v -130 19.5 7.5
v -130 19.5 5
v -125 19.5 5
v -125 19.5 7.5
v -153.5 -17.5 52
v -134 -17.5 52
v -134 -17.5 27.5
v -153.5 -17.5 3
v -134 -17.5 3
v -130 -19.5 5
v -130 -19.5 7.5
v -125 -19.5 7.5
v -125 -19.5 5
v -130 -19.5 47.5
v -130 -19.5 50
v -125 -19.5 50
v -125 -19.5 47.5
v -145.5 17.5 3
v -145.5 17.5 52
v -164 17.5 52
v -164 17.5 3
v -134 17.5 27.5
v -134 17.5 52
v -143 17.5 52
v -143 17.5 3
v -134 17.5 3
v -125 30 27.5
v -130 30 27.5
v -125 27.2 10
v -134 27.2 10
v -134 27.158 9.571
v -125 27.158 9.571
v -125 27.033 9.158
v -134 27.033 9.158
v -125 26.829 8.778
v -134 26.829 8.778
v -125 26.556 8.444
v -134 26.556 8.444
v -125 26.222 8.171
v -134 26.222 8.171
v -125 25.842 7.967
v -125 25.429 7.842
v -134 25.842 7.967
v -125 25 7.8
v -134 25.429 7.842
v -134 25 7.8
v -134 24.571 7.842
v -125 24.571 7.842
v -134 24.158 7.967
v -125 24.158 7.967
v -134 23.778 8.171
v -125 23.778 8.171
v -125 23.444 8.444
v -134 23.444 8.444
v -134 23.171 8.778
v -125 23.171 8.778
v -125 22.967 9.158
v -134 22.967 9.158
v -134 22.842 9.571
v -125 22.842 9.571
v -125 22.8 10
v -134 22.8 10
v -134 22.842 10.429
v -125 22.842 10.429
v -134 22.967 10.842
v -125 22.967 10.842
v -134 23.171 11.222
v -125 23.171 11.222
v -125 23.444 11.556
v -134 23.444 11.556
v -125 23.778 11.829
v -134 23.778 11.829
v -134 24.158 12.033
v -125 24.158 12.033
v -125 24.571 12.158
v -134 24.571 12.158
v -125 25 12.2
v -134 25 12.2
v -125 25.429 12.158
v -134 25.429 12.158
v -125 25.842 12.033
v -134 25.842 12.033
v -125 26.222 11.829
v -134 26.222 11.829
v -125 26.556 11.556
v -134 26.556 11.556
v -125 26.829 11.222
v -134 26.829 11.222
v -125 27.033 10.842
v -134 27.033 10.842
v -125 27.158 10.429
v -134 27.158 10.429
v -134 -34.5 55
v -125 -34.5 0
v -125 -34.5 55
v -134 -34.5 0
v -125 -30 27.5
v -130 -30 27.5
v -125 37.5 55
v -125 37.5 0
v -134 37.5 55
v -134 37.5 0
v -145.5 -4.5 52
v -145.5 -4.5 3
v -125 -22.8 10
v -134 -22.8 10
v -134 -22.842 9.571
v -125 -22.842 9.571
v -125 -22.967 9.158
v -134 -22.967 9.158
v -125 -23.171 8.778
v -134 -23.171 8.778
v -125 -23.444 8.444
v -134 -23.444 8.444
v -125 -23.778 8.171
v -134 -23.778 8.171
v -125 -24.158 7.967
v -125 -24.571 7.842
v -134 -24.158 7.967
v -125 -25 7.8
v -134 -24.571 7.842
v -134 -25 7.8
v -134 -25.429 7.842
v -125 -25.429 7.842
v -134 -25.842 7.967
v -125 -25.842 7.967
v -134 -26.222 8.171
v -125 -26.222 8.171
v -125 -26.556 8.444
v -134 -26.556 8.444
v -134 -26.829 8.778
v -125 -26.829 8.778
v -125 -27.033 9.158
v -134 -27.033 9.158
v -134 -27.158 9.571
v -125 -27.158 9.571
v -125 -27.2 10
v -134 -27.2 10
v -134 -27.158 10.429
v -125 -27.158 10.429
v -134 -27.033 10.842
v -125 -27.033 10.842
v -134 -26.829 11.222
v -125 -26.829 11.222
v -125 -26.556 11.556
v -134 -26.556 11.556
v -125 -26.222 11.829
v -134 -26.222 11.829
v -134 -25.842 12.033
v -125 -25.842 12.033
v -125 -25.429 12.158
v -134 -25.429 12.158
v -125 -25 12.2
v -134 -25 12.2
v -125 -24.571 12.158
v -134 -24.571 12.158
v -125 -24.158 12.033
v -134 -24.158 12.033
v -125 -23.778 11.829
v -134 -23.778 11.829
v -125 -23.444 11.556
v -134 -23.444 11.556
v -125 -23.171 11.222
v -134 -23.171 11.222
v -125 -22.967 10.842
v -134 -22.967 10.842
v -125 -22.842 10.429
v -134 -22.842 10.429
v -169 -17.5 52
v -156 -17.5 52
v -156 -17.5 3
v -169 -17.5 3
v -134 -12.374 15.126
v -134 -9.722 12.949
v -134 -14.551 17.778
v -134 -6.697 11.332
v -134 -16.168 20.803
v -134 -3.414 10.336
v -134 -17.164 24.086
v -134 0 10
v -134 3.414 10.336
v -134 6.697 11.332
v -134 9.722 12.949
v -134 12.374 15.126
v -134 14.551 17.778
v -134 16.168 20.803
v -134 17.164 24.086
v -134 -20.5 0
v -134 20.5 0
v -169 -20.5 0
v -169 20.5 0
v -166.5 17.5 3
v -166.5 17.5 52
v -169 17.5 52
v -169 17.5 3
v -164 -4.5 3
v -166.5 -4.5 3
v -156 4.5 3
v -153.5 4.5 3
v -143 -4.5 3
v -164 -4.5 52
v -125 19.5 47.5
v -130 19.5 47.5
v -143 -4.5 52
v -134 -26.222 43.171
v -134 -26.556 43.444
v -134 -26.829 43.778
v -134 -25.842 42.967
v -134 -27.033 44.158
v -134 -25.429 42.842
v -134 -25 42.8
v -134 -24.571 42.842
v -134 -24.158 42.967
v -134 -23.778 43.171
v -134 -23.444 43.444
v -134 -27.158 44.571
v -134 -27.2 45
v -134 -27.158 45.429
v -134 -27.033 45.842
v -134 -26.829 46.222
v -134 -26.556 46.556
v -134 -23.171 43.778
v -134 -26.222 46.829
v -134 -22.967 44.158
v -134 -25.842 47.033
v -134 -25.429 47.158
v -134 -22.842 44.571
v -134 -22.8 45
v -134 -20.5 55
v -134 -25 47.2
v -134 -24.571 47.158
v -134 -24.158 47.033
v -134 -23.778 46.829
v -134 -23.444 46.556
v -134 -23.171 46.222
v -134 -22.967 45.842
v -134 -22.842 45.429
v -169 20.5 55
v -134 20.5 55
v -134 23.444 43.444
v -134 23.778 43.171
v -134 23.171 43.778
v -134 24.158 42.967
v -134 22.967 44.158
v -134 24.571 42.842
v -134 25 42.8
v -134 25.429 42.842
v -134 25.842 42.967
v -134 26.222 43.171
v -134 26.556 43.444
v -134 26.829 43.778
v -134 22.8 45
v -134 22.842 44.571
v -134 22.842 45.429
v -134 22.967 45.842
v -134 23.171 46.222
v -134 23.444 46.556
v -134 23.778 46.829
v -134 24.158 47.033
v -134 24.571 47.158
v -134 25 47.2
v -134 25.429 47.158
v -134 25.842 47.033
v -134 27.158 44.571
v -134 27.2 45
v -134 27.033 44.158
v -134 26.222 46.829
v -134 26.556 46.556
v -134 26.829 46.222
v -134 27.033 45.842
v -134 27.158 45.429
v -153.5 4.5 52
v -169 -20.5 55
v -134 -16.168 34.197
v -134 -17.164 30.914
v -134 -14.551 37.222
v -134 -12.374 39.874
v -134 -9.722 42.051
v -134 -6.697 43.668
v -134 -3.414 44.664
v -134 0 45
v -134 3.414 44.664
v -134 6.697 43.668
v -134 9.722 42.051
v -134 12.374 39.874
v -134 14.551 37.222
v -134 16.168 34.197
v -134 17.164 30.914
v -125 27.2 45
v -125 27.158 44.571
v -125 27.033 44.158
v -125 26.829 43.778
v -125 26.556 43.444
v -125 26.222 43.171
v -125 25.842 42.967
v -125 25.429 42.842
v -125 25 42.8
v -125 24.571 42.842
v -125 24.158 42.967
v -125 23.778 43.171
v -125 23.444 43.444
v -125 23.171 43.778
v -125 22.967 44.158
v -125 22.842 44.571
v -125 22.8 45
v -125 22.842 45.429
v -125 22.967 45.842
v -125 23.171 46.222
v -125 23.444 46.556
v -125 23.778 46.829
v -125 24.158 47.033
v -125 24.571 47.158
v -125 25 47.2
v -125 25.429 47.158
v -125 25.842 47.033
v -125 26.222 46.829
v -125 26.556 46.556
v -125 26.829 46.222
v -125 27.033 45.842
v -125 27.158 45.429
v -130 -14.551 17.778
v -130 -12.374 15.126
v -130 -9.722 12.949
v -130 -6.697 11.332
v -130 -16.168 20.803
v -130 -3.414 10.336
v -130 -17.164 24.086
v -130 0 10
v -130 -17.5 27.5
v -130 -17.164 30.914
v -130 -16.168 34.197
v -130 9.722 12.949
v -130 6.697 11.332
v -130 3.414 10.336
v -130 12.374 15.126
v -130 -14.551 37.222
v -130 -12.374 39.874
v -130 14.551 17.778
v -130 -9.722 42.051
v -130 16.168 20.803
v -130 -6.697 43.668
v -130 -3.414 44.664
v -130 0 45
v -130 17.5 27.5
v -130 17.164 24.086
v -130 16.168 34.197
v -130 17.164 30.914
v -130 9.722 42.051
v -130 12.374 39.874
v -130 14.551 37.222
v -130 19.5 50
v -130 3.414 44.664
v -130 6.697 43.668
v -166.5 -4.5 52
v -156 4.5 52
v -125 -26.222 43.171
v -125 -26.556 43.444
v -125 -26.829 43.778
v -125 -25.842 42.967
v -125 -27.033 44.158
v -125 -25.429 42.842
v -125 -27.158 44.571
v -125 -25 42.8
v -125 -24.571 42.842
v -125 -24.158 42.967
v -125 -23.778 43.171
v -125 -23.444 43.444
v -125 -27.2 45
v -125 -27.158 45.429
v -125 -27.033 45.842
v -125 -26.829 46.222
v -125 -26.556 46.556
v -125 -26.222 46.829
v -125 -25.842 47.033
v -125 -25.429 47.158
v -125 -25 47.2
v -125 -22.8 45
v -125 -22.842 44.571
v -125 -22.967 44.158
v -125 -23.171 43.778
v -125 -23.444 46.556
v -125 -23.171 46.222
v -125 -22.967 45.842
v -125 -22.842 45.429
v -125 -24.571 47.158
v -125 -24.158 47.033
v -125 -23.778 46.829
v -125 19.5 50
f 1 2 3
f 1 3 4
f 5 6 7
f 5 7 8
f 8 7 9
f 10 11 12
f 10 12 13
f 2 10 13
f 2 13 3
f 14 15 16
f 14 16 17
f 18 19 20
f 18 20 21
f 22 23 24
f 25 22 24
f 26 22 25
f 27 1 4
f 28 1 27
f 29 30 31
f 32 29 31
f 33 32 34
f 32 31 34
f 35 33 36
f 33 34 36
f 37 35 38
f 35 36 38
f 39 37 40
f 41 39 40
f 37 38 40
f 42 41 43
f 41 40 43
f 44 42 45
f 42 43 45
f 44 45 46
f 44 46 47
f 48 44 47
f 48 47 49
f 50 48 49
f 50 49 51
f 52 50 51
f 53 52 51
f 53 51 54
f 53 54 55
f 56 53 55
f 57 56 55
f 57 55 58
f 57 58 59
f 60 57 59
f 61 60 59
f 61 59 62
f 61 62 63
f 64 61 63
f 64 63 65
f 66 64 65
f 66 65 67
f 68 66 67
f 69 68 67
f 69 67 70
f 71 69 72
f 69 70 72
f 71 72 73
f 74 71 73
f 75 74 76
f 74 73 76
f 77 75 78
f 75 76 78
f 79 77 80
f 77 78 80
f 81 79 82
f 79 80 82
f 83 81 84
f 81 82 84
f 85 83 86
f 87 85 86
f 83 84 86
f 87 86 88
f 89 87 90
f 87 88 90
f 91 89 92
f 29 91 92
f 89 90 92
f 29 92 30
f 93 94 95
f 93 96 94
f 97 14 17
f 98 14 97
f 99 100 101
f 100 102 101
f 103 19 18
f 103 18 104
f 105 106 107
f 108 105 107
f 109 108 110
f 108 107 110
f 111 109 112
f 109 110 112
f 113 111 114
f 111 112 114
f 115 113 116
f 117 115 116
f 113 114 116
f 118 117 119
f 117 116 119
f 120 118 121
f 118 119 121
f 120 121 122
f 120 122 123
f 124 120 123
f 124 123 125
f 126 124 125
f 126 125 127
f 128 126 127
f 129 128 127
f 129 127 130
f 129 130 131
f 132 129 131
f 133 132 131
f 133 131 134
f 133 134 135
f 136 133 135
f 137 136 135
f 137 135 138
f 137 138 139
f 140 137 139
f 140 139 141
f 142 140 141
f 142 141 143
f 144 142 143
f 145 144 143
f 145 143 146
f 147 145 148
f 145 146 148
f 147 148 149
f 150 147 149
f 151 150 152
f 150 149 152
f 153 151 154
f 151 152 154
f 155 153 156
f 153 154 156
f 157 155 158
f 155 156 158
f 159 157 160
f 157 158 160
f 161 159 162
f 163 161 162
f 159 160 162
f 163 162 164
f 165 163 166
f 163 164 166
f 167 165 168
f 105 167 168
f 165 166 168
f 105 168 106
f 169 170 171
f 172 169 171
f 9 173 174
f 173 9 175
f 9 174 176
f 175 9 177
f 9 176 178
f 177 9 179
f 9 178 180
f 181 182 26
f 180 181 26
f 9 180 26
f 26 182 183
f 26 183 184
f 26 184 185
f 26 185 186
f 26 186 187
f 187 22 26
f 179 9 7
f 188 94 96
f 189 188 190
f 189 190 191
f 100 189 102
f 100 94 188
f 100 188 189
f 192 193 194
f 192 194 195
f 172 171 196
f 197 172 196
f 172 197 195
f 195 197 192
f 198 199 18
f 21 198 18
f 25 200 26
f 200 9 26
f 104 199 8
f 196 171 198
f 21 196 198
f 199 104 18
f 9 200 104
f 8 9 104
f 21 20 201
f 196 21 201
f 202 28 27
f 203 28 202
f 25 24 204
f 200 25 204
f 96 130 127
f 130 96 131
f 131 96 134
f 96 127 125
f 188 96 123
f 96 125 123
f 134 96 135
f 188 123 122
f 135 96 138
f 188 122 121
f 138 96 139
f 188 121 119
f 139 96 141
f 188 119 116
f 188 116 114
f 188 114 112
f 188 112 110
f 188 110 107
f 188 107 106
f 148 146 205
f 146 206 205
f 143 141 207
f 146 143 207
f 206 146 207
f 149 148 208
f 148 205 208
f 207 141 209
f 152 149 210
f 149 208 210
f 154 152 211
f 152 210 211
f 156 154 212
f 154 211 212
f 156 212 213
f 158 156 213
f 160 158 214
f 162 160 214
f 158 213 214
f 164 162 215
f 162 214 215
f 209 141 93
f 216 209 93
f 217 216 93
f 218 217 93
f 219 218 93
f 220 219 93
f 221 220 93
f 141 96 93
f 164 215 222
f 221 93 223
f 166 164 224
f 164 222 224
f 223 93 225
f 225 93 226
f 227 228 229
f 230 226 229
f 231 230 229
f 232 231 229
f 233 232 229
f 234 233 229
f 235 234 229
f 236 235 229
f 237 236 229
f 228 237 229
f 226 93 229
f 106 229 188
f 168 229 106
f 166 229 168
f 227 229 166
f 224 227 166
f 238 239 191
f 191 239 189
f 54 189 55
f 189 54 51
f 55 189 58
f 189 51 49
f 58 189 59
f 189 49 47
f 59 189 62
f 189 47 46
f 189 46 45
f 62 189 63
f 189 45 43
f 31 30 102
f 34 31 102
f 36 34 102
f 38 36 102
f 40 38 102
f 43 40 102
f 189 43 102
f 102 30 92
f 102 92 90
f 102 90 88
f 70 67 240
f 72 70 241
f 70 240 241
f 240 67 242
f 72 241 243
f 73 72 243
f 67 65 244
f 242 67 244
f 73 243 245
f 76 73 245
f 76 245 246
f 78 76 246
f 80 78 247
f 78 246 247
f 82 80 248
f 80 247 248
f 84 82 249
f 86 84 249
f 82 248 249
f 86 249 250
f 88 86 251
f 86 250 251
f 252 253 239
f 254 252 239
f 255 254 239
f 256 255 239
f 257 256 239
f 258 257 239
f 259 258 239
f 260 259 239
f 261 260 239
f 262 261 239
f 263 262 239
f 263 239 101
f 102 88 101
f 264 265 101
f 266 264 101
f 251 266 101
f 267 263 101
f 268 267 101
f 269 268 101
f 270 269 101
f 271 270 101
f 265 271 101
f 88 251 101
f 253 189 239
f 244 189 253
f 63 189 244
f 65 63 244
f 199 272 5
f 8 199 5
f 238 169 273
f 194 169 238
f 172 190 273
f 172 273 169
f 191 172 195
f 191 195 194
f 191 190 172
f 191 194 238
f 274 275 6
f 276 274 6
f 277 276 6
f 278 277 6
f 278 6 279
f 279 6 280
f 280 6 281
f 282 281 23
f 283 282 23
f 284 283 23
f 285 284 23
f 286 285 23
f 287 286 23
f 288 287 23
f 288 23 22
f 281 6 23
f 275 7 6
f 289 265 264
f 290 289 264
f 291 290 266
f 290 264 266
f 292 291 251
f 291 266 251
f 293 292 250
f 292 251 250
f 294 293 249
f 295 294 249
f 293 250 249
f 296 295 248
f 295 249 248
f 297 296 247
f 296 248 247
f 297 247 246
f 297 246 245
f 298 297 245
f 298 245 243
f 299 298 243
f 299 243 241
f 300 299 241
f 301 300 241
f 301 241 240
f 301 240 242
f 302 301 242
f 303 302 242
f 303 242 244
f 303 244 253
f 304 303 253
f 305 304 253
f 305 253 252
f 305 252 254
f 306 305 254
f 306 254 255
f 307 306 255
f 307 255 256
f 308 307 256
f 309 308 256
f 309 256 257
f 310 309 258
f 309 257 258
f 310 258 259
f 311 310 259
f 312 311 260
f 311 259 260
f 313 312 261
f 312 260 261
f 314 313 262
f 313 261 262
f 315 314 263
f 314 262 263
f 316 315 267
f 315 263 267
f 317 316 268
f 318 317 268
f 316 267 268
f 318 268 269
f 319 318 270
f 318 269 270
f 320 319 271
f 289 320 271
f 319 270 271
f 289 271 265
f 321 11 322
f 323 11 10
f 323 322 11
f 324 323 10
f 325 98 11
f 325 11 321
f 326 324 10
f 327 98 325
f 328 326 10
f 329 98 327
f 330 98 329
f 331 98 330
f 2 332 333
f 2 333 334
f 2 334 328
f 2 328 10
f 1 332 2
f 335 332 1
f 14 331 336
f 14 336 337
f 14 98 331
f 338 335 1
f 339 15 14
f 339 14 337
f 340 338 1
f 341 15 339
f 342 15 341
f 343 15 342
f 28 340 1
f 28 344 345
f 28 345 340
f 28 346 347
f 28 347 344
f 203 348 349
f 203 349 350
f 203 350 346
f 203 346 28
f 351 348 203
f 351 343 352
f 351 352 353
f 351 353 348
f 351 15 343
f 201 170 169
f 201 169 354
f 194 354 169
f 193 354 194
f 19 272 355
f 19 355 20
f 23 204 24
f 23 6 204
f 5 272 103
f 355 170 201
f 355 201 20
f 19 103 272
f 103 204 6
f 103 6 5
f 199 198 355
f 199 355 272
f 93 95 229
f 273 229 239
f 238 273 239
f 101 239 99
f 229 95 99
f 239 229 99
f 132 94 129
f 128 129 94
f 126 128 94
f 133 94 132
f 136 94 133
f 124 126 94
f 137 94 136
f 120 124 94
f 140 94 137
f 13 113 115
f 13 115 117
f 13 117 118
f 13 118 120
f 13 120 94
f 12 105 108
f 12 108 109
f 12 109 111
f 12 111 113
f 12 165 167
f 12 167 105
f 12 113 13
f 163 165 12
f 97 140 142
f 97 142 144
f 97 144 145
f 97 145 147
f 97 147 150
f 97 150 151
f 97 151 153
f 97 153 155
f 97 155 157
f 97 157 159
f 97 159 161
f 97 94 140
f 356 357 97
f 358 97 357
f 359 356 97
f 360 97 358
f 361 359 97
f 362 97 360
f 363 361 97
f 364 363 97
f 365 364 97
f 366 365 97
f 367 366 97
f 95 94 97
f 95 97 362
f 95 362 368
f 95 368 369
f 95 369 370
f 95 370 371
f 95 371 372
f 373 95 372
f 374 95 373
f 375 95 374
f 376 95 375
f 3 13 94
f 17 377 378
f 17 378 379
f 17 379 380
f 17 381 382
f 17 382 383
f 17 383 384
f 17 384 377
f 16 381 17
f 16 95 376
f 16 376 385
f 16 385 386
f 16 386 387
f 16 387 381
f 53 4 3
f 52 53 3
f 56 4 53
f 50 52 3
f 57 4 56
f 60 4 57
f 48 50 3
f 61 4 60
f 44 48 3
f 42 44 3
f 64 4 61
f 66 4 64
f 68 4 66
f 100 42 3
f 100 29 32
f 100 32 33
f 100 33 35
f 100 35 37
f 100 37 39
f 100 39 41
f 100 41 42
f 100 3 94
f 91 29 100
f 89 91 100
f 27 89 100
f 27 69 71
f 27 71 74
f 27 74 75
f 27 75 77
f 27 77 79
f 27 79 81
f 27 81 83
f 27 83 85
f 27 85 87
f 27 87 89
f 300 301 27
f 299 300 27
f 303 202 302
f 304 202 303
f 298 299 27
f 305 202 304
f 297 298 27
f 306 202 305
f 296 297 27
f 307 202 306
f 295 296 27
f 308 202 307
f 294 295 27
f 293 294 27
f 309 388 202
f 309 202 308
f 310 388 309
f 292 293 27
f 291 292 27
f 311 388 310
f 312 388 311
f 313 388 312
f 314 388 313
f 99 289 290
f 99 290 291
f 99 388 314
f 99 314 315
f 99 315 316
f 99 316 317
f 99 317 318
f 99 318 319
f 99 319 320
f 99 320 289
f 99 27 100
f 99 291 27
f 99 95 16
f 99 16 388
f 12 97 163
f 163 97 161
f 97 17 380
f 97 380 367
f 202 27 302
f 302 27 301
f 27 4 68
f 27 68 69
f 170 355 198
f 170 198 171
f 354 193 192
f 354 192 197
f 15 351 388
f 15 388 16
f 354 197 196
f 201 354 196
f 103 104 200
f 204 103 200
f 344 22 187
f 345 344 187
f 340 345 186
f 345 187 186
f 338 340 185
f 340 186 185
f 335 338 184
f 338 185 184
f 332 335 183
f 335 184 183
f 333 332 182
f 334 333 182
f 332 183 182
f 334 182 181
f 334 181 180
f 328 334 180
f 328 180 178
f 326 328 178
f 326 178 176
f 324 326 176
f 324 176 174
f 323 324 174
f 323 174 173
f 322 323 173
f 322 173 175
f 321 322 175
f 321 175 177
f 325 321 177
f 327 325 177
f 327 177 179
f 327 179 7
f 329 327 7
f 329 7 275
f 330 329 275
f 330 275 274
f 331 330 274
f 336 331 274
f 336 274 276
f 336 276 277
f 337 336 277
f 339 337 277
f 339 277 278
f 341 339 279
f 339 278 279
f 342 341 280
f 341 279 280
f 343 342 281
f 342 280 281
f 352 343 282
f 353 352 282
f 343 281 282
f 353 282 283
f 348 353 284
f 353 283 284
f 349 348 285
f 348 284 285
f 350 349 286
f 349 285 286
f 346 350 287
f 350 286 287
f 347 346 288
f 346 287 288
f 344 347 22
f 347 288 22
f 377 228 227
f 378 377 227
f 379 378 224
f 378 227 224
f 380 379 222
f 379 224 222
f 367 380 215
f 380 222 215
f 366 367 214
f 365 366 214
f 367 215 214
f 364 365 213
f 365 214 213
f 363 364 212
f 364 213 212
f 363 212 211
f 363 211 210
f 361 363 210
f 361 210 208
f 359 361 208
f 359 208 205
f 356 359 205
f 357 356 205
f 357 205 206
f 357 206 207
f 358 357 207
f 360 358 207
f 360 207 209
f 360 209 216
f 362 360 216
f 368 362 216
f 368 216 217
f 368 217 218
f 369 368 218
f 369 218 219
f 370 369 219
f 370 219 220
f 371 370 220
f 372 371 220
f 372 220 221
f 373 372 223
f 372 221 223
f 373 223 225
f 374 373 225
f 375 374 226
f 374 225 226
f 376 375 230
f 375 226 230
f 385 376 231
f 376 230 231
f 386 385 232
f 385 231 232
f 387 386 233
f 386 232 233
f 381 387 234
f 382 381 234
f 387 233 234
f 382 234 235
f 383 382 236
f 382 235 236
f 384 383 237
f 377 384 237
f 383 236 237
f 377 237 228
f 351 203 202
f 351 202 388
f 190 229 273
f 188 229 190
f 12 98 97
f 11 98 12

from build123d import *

# Parameters (mm, degrees)
SKETCH044_W     = 72
SKETCH044_H     = 55
PAD022_DEPTH    = 4
SKETCH046_R     = 17.5
POCKET015_DEPTH = 4.001
SKETCH047_W     = 72
SKETCH047_H     = 55
PAD023_DEPTH    = 5
SKETCH045_R     = 2.2
HOLE007_DEPTH   = 25
SKETCH048_W     = 41
SKETCH048_H     = 55
SKETCH048_W_2   = 35
SKETCH048_H_2   = 49
PAD024_DEPTH    = 35
SKETCH049_W     = 22
SKETCH049_H     = 2.5
PAD025_DEPTH    = 49


with BuildPart() as part:
    # Sketch044 → Pad022 (new body)
    with BuildSketch(Plane.YZ.offset(-130)):
        with Locations((1.5, 27.5)):
            Rectangle(SKETCH044_W, SKETCH044_H)
    extrude(amount=-PAD022_DEPTH)

    # Sketch046 (on Face5 of Hole007) → Pocket015 (cut, through all)
    with BuildSketch(Plane(origin=(-134, 0, 0), x_dir=(0, 1, 0), z_dir=(-1, 0, 0))):
        with Locations((0, -27.5)):
            Circle(SKETCH046_R)
    extrude(amount=-POCKET015_DEPTH, mode=Mode.SUBTRACT)

    # Sketch047 (on Face4 of Pocket015) → Pad023 (join)
    with BuildSketch(Plane.YZ.offset(-130)):
        with Locations((1.5, 27.5)):
            Rectangle(SKETCH047_W, SKETCH047_H)
        Polygon((-30, 27.5), (-19.5, 7.5), (-19.5, 5), (19.5, 5), (19.5, 7.5), (30, 27.5), (19.5, 47.5), (19.5, 50), (-19.5, 50), (-19.5, 47.5), align=None, mode=Mode.SUBTRACT)
    extrude(amount=PAD023_DEPTH)

    # Sketch045 (on Face6 of Pad022) → Hole007 (cut)
    with BuildSketch(Plane(origin=(-134, 0, 0), x_dir=(0, 1, 0), z_dir=(-1, 0, 0))):
        with Locations((-25, -10)):
            Circle(SKETCH045_R)
        with Locations((-25, -45)):
            Circle(SKETCH045_R)
        with Locations((25, -45)):
            Circle(SKETCH045_R)
        with Locations((25, -10)):
            Circle(SKETCH045_R)
    extrude(amount=-HOLE007_DEPTH, mode=Mode.SUBTRACT)

    # Sketch048 (on Face5 of Hole007) → Pad024 (join)
    with BuildSketch(Plane(origin=(-134, 0, 0), x_dir=(0, 1, 0), z_dir=(-1, 0, 0))):
        with Locations((0, -27.5)):
            Rectangle(SKETCH048_W, SKETCH048_H)
        with Locations((0, -27.5)):
            Rectangle(SKETCH048_W_2, SKETCH048_H_2, mode=Mode.SUBTRACT)
    extrude(amount=PAD024_DEPTH)

    # Sketch049 (on Face31 of Pad024) → Pad025 (join)
    with BuildSketch(Plane(origin=(0, 0, 3), x_dir=(0, -1, 0), z_dir=(0, 0, 1))):
        with Locations((-6.5, -144.25)):
            Rectangle(SKETCH049_W, SKETCH049_H)
        with Locations((6.5, -154.75)):
            Rectangle(SKETCH049_W, SKETCH049_H)
        with Locations((-6.5, -165.25)):
            Rectangle(SKETCH049_W, SKETCH049_H)
    extrude(amount=PAD025_DEPTH)


solid = part.part
